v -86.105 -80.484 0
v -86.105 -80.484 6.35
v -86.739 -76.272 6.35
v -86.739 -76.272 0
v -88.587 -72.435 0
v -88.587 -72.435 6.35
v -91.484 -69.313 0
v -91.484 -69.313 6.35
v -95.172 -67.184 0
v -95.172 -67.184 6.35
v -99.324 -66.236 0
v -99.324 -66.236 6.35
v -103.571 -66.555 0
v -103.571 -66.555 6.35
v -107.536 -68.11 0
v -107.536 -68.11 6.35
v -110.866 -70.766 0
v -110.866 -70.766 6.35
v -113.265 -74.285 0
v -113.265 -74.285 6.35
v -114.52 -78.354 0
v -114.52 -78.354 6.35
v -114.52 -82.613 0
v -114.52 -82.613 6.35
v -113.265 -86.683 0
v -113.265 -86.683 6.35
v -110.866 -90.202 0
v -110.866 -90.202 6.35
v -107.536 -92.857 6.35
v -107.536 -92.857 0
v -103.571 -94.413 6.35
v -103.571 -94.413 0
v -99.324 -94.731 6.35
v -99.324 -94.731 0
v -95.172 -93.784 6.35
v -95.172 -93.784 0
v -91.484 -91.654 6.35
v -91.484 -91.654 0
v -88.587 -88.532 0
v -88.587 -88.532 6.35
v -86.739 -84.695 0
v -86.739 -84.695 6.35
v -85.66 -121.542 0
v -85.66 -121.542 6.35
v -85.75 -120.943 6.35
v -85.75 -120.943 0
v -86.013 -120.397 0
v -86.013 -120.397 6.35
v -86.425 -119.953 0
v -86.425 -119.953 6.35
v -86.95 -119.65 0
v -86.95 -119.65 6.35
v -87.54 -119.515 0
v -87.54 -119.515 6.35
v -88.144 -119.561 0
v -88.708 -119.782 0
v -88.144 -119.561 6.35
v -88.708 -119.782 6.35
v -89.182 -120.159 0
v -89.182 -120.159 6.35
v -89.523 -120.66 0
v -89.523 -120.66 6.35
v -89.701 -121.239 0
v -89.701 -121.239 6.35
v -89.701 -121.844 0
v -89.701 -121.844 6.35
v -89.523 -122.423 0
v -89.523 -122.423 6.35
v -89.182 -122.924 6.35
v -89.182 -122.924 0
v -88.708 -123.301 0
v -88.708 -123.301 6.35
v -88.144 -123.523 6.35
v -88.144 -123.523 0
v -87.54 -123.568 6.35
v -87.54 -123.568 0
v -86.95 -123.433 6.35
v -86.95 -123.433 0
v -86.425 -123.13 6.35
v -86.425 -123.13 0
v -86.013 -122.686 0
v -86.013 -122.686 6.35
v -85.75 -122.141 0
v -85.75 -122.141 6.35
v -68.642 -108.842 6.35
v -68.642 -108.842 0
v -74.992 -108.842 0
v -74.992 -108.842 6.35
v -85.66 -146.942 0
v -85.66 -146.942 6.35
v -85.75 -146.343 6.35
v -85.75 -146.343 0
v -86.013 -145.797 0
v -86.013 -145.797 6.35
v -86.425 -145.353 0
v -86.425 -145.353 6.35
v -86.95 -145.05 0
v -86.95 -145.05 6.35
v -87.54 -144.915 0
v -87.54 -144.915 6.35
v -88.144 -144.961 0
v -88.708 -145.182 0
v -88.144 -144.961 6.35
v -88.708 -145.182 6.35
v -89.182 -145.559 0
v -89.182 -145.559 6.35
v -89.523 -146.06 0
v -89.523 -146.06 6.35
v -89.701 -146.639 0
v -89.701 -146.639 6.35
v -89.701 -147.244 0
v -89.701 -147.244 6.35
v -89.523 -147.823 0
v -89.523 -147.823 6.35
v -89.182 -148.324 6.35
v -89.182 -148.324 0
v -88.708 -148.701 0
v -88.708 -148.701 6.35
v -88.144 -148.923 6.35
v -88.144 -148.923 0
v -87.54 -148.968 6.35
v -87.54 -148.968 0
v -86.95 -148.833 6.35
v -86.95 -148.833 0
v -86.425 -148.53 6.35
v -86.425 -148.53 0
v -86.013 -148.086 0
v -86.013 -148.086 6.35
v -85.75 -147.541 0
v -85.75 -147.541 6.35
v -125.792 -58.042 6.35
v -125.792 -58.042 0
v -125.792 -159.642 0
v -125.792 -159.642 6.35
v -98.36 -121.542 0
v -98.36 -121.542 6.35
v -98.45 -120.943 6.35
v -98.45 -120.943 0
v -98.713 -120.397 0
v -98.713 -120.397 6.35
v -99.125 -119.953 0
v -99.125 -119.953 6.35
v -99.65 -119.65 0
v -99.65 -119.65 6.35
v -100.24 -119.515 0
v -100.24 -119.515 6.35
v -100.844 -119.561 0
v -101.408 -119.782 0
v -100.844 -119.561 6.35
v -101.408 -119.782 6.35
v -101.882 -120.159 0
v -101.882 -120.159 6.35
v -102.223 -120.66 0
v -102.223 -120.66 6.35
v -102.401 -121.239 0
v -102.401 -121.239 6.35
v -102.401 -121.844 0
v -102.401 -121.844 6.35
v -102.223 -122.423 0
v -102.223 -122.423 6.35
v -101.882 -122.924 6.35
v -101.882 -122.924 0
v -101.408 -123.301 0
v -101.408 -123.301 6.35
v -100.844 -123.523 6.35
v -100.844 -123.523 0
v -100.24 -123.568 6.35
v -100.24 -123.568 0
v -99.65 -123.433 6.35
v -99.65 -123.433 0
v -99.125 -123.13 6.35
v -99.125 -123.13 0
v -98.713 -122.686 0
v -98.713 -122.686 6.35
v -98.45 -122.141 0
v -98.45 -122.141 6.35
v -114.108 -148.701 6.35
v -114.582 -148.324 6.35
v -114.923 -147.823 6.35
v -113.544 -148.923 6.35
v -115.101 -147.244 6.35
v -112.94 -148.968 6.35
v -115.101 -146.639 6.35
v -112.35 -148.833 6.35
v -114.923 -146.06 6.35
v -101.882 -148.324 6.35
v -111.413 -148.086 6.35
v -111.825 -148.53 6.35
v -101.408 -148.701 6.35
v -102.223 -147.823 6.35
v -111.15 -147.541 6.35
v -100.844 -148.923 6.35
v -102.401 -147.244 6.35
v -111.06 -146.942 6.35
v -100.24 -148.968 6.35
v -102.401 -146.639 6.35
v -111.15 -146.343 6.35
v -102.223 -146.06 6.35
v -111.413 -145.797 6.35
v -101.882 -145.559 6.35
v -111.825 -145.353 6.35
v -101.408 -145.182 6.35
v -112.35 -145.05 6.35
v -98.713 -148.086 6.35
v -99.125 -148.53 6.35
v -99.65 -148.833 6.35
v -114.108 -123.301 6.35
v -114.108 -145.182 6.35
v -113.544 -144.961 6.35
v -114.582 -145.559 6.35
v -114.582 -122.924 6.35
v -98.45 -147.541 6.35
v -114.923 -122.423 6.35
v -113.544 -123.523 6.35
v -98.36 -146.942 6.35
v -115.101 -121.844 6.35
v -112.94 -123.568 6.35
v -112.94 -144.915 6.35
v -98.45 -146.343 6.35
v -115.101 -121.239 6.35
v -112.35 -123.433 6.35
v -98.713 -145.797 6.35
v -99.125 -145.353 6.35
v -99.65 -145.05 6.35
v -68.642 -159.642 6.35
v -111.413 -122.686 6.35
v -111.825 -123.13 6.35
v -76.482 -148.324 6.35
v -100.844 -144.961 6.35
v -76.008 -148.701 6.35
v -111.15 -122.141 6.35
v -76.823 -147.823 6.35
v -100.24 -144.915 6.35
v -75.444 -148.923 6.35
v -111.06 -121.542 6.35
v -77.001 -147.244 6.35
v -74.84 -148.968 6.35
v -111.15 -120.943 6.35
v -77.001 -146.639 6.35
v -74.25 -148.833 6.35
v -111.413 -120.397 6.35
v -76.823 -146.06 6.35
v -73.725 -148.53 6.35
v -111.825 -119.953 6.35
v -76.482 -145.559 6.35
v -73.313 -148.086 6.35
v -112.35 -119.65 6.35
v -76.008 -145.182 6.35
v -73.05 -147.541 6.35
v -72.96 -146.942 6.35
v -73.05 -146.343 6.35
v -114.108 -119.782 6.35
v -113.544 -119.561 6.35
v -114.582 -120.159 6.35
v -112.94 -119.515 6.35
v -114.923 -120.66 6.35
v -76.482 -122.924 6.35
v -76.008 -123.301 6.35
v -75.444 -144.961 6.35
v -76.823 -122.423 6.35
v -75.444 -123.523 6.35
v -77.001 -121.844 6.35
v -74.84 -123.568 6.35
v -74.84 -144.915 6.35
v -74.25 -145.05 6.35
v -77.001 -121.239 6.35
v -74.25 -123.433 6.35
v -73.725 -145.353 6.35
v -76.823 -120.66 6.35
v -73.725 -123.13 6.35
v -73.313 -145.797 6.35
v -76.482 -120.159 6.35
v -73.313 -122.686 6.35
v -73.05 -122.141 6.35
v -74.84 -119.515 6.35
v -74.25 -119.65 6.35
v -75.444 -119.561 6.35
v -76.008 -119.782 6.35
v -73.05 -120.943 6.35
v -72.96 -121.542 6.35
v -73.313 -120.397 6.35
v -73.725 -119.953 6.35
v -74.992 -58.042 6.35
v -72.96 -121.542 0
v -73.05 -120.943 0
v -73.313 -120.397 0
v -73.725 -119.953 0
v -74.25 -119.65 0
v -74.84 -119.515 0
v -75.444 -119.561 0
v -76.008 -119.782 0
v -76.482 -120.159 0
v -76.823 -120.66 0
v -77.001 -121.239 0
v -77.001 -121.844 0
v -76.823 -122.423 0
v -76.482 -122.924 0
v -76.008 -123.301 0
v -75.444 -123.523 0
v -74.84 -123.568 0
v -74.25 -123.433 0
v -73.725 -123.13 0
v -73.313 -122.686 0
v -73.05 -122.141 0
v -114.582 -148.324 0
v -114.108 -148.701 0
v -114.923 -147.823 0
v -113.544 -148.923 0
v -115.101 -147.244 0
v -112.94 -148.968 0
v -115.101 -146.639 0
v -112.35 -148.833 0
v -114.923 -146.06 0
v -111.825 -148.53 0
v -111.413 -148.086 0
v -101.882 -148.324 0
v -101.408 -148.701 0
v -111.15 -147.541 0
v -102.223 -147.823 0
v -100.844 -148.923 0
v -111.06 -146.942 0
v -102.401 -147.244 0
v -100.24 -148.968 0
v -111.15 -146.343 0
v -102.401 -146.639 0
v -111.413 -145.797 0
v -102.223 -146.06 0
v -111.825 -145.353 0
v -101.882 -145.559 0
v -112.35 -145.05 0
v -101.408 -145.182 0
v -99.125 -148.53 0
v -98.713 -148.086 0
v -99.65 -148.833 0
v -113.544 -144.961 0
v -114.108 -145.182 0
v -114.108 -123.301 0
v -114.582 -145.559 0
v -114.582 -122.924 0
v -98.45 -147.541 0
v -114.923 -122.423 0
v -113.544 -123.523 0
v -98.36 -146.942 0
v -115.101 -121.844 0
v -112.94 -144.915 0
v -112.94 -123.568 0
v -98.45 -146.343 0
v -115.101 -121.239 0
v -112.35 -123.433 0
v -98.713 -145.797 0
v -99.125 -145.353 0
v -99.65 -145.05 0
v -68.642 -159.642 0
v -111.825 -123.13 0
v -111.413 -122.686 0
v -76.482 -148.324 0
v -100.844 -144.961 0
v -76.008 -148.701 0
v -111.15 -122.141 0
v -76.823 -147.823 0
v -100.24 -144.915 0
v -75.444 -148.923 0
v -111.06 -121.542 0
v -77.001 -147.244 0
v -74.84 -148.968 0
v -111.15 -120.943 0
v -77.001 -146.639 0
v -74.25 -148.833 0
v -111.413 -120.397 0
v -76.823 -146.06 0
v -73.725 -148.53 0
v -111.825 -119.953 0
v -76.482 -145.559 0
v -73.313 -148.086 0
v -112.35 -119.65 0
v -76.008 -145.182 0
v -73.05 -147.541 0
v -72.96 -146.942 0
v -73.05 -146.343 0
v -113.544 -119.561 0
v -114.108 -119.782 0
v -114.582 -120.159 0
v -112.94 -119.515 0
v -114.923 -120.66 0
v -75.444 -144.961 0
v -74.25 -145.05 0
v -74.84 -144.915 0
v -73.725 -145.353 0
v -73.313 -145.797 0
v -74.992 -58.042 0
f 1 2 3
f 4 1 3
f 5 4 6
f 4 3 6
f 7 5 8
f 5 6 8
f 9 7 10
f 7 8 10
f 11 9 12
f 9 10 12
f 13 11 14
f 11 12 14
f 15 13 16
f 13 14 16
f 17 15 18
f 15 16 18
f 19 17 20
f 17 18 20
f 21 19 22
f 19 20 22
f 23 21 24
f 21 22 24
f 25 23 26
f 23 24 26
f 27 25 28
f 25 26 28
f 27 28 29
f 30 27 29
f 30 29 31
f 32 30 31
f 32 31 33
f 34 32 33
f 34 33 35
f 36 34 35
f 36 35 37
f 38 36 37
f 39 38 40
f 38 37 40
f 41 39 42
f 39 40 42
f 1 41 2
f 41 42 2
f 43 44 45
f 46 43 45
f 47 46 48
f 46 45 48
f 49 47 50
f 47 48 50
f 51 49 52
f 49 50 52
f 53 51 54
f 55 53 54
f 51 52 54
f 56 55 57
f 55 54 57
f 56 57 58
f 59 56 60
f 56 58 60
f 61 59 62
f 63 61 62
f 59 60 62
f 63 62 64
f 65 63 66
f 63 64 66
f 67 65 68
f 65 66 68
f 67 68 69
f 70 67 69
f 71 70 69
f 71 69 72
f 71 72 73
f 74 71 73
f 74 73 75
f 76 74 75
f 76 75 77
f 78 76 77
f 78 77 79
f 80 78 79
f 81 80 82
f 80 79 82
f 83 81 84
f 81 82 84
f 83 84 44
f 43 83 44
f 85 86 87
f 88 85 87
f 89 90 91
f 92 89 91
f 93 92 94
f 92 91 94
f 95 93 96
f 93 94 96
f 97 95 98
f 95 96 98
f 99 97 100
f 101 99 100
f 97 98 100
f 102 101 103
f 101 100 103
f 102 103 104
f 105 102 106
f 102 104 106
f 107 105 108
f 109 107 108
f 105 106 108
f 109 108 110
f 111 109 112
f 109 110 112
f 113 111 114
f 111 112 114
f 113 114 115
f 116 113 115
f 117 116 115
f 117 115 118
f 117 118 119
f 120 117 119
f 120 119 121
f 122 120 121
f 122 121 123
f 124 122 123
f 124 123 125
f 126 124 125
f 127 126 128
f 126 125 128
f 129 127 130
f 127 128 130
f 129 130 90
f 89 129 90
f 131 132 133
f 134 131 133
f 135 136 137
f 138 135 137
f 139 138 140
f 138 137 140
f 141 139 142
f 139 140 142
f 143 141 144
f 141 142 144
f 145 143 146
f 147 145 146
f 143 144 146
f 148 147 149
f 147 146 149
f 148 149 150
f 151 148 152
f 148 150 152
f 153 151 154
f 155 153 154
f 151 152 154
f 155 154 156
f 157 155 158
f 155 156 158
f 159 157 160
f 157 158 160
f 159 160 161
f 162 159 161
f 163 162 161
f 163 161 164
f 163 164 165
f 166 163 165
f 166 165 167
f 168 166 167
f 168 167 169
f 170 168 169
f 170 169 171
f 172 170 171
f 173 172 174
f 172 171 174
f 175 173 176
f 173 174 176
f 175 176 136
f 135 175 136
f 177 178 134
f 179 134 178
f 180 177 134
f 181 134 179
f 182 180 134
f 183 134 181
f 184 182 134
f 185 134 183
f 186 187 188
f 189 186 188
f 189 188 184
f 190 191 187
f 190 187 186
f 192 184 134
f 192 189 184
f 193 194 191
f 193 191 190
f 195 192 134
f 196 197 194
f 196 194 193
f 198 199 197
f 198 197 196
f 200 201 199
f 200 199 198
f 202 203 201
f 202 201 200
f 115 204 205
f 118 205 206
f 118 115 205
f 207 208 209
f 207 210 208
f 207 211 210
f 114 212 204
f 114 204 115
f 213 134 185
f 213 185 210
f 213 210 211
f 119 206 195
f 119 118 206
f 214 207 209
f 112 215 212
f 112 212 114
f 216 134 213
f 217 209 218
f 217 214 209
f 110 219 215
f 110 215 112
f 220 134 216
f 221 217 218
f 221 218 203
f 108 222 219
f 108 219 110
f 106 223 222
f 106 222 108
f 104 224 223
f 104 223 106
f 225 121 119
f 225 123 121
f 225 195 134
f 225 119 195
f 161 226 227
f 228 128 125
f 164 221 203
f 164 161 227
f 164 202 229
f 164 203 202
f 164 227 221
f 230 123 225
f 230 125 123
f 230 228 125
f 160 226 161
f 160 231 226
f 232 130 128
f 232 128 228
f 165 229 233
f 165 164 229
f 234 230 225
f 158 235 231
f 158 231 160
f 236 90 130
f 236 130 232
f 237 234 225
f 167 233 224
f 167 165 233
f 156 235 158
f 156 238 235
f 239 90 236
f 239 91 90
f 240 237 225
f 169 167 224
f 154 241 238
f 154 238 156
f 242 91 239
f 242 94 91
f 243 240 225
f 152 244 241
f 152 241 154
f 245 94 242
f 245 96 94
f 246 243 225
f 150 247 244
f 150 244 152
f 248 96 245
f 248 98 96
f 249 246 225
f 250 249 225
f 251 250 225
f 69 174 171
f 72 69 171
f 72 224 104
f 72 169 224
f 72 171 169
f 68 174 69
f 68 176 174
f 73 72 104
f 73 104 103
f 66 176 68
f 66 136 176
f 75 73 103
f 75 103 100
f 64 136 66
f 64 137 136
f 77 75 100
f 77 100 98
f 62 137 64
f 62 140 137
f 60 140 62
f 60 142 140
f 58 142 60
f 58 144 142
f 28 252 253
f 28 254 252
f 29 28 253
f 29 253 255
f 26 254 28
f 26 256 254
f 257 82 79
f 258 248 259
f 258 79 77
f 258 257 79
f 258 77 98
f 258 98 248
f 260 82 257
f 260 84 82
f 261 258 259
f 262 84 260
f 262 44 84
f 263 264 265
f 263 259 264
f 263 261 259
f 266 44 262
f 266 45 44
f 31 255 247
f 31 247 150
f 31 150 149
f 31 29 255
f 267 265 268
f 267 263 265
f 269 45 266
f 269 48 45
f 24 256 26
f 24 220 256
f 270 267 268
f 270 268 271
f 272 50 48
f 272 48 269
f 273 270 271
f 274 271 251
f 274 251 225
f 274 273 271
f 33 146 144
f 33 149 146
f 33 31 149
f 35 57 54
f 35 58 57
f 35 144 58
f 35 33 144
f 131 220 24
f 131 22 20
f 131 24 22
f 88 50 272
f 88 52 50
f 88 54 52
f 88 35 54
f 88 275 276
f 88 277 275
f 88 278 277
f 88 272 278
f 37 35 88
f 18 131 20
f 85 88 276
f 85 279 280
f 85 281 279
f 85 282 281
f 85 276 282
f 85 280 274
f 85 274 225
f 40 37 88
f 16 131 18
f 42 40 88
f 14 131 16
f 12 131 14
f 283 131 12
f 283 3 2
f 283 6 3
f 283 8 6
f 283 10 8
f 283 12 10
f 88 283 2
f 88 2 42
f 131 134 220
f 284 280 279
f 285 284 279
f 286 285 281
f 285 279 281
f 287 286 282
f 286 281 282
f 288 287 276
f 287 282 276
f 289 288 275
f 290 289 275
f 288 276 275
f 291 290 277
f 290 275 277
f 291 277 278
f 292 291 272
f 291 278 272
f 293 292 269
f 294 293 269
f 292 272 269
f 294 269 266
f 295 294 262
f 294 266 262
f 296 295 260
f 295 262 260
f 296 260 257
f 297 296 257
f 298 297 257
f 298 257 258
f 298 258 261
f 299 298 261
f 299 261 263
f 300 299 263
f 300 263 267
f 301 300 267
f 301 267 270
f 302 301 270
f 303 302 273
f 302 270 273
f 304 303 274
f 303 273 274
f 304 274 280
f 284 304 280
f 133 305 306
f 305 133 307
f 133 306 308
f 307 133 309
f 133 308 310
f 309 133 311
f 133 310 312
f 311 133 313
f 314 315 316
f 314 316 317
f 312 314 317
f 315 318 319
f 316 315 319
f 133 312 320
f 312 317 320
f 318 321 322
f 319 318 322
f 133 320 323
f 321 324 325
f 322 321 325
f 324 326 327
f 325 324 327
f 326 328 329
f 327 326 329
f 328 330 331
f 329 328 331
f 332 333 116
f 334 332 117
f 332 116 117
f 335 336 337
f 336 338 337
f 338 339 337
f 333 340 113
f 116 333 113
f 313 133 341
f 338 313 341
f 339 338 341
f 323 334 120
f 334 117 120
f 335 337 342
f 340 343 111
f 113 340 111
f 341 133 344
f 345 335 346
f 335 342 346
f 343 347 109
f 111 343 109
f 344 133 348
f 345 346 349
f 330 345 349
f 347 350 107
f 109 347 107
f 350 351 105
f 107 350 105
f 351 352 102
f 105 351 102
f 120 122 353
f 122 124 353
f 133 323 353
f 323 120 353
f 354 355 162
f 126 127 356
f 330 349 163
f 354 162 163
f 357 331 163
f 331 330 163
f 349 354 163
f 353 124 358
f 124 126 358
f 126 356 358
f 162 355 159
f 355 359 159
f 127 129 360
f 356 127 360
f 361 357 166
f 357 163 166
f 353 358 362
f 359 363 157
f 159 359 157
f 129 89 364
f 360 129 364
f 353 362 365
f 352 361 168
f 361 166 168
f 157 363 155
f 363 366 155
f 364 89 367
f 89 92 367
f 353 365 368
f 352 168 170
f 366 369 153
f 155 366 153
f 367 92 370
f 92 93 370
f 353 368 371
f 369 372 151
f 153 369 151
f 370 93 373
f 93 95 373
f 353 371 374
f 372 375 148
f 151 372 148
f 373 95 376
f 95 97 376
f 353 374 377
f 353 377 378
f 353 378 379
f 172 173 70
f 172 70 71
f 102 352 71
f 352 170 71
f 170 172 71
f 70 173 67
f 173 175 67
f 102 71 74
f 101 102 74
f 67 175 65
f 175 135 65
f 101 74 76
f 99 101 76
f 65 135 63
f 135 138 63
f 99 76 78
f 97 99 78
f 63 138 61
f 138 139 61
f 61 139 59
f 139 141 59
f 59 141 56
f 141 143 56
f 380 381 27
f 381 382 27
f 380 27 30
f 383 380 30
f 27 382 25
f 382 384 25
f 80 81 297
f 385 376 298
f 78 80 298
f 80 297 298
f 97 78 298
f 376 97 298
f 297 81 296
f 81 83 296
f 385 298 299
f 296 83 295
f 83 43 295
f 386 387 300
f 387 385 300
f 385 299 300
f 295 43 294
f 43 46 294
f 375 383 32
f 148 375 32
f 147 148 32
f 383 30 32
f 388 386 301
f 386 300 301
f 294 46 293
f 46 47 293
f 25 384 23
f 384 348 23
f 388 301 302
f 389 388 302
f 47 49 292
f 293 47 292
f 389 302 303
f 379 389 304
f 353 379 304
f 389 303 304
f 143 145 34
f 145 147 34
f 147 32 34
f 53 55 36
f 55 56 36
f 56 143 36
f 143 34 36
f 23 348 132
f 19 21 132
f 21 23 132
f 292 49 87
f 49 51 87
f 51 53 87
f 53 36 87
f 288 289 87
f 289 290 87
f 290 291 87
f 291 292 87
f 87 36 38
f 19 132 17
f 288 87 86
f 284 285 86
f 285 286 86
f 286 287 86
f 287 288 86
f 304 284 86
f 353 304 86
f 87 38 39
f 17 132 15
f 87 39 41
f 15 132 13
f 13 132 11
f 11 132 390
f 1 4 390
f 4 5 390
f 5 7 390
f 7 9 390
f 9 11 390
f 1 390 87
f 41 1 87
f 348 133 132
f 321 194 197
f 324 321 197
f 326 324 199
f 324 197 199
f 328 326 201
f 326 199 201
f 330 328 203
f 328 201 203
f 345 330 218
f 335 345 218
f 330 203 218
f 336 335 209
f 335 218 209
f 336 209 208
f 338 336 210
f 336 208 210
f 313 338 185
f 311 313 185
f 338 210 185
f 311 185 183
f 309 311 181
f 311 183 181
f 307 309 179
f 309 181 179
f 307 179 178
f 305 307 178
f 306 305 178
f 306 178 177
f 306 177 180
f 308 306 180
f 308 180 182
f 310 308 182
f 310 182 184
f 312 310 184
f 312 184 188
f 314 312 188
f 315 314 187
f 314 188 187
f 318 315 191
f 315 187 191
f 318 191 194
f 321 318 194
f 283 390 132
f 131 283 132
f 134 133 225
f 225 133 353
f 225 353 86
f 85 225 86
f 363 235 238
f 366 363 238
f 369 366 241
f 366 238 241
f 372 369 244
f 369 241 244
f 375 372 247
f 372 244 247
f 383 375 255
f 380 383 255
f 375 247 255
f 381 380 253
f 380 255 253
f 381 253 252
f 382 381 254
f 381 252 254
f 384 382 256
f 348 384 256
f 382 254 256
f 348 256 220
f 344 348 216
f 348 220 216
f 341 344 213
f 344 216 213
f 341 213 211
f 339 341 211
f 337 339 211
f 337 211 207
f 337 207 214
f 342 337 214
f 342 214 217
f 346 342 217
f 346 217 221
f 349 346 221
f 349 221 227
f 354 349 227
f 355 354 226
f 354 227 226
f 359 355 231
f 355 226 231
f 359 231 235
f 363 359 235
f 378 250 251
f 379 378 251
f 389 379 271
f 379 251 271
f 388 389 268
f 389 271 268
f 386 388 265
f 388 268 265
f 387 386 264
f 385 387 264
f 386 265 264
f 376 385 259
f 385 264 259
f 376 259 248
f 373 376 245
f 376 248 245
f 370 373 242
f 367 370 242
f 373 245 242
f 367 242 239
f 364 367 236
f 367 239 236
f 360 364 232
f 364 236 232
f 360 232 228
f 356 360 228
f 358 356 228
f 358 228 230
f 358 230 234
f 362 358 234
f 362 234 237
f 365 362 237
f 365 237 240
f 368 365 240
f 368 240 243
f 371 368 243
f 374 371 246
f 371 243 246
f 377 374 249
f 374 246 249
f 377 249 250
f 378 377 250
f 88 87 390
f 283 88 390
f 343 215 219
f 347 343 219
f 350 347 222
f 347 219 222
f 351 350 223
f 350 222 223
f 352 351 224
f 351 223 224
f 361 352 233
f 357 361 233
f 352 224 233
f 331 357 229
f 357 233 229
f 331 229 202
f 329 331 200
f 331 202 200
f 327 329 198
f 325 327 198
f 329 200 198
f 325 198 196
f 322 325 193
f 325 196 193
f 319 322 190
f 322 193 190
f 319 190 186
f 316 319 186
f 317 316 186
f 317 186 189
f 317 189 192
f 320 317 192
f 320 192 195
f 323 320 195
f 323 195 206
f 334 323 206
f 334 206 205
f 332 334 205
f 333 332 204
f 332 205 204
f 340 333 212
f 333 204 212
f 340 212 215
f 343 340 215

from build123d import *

# Parameters (mm, degrees)
BOSS_EXTRUDE1_DEPTH = 6.35
SKETCH3_R           = 14.2875
SKETCH3_R_2         = 2.032
CUT_EXTRUDE1_DEPTH  = 6.35


with BuildPart() as part:
    # Sketch2 → Boss-Extrude1 (new body)
    with BuildSketch(Plane.XY):
        Polygon((-125.79203122, -159.641560721), (-74.99203122, -159.641560721), (-68.64203122, -159.641560721), (-68.64203122, -108.841560721), (-74.99203122, -108.841560721), (-74.99203122, -58.041560721), (-125.79203122, -58.041560721), align=None)
    extrude(amount=BOSS_EXTRUDE1_DEPTH)

    # Sketch3 → Cut-Extrude1 (cut)
    with BuildSketch(Plane.XY.offset(6.35)):
        with Locations((-100.39203122, -80.483788015)):
            Circle(SKETCH3_R)
        with Locations((-87.69203122, -146.941560721)):
            Circle(SKETCH3_R_2)
        with Locations((-113.09203122, -146.941560721)):
            Circle(SKETCH3_R_2)
        with Locations((-100.39203122, -146.941560721)):
            Circle(SKETCH3_R_2)
        with Locations((-74.99203122, -146.941560721)):
            Circle(SKETCH3_R_2)
        with Locations((-113.09203122, -121.541560721)):
            Circle(SKETCH3_R_2)
        with Locations((-87.69203122, -121.541560721)):
            Circle(SKETCH3_R_2)
        with Locations((-74.99203122, -121.541560721)):
            Circle(SKETCH3_R_2)
        with Locations((-100.39203122, -121.541560721)):
            Circle(SKETCH3_R_2)
    extrude(amount=-CUT_EXTRUDE1_DEPTH, mode=Mode.SUBTRACT)


solid = part.part
